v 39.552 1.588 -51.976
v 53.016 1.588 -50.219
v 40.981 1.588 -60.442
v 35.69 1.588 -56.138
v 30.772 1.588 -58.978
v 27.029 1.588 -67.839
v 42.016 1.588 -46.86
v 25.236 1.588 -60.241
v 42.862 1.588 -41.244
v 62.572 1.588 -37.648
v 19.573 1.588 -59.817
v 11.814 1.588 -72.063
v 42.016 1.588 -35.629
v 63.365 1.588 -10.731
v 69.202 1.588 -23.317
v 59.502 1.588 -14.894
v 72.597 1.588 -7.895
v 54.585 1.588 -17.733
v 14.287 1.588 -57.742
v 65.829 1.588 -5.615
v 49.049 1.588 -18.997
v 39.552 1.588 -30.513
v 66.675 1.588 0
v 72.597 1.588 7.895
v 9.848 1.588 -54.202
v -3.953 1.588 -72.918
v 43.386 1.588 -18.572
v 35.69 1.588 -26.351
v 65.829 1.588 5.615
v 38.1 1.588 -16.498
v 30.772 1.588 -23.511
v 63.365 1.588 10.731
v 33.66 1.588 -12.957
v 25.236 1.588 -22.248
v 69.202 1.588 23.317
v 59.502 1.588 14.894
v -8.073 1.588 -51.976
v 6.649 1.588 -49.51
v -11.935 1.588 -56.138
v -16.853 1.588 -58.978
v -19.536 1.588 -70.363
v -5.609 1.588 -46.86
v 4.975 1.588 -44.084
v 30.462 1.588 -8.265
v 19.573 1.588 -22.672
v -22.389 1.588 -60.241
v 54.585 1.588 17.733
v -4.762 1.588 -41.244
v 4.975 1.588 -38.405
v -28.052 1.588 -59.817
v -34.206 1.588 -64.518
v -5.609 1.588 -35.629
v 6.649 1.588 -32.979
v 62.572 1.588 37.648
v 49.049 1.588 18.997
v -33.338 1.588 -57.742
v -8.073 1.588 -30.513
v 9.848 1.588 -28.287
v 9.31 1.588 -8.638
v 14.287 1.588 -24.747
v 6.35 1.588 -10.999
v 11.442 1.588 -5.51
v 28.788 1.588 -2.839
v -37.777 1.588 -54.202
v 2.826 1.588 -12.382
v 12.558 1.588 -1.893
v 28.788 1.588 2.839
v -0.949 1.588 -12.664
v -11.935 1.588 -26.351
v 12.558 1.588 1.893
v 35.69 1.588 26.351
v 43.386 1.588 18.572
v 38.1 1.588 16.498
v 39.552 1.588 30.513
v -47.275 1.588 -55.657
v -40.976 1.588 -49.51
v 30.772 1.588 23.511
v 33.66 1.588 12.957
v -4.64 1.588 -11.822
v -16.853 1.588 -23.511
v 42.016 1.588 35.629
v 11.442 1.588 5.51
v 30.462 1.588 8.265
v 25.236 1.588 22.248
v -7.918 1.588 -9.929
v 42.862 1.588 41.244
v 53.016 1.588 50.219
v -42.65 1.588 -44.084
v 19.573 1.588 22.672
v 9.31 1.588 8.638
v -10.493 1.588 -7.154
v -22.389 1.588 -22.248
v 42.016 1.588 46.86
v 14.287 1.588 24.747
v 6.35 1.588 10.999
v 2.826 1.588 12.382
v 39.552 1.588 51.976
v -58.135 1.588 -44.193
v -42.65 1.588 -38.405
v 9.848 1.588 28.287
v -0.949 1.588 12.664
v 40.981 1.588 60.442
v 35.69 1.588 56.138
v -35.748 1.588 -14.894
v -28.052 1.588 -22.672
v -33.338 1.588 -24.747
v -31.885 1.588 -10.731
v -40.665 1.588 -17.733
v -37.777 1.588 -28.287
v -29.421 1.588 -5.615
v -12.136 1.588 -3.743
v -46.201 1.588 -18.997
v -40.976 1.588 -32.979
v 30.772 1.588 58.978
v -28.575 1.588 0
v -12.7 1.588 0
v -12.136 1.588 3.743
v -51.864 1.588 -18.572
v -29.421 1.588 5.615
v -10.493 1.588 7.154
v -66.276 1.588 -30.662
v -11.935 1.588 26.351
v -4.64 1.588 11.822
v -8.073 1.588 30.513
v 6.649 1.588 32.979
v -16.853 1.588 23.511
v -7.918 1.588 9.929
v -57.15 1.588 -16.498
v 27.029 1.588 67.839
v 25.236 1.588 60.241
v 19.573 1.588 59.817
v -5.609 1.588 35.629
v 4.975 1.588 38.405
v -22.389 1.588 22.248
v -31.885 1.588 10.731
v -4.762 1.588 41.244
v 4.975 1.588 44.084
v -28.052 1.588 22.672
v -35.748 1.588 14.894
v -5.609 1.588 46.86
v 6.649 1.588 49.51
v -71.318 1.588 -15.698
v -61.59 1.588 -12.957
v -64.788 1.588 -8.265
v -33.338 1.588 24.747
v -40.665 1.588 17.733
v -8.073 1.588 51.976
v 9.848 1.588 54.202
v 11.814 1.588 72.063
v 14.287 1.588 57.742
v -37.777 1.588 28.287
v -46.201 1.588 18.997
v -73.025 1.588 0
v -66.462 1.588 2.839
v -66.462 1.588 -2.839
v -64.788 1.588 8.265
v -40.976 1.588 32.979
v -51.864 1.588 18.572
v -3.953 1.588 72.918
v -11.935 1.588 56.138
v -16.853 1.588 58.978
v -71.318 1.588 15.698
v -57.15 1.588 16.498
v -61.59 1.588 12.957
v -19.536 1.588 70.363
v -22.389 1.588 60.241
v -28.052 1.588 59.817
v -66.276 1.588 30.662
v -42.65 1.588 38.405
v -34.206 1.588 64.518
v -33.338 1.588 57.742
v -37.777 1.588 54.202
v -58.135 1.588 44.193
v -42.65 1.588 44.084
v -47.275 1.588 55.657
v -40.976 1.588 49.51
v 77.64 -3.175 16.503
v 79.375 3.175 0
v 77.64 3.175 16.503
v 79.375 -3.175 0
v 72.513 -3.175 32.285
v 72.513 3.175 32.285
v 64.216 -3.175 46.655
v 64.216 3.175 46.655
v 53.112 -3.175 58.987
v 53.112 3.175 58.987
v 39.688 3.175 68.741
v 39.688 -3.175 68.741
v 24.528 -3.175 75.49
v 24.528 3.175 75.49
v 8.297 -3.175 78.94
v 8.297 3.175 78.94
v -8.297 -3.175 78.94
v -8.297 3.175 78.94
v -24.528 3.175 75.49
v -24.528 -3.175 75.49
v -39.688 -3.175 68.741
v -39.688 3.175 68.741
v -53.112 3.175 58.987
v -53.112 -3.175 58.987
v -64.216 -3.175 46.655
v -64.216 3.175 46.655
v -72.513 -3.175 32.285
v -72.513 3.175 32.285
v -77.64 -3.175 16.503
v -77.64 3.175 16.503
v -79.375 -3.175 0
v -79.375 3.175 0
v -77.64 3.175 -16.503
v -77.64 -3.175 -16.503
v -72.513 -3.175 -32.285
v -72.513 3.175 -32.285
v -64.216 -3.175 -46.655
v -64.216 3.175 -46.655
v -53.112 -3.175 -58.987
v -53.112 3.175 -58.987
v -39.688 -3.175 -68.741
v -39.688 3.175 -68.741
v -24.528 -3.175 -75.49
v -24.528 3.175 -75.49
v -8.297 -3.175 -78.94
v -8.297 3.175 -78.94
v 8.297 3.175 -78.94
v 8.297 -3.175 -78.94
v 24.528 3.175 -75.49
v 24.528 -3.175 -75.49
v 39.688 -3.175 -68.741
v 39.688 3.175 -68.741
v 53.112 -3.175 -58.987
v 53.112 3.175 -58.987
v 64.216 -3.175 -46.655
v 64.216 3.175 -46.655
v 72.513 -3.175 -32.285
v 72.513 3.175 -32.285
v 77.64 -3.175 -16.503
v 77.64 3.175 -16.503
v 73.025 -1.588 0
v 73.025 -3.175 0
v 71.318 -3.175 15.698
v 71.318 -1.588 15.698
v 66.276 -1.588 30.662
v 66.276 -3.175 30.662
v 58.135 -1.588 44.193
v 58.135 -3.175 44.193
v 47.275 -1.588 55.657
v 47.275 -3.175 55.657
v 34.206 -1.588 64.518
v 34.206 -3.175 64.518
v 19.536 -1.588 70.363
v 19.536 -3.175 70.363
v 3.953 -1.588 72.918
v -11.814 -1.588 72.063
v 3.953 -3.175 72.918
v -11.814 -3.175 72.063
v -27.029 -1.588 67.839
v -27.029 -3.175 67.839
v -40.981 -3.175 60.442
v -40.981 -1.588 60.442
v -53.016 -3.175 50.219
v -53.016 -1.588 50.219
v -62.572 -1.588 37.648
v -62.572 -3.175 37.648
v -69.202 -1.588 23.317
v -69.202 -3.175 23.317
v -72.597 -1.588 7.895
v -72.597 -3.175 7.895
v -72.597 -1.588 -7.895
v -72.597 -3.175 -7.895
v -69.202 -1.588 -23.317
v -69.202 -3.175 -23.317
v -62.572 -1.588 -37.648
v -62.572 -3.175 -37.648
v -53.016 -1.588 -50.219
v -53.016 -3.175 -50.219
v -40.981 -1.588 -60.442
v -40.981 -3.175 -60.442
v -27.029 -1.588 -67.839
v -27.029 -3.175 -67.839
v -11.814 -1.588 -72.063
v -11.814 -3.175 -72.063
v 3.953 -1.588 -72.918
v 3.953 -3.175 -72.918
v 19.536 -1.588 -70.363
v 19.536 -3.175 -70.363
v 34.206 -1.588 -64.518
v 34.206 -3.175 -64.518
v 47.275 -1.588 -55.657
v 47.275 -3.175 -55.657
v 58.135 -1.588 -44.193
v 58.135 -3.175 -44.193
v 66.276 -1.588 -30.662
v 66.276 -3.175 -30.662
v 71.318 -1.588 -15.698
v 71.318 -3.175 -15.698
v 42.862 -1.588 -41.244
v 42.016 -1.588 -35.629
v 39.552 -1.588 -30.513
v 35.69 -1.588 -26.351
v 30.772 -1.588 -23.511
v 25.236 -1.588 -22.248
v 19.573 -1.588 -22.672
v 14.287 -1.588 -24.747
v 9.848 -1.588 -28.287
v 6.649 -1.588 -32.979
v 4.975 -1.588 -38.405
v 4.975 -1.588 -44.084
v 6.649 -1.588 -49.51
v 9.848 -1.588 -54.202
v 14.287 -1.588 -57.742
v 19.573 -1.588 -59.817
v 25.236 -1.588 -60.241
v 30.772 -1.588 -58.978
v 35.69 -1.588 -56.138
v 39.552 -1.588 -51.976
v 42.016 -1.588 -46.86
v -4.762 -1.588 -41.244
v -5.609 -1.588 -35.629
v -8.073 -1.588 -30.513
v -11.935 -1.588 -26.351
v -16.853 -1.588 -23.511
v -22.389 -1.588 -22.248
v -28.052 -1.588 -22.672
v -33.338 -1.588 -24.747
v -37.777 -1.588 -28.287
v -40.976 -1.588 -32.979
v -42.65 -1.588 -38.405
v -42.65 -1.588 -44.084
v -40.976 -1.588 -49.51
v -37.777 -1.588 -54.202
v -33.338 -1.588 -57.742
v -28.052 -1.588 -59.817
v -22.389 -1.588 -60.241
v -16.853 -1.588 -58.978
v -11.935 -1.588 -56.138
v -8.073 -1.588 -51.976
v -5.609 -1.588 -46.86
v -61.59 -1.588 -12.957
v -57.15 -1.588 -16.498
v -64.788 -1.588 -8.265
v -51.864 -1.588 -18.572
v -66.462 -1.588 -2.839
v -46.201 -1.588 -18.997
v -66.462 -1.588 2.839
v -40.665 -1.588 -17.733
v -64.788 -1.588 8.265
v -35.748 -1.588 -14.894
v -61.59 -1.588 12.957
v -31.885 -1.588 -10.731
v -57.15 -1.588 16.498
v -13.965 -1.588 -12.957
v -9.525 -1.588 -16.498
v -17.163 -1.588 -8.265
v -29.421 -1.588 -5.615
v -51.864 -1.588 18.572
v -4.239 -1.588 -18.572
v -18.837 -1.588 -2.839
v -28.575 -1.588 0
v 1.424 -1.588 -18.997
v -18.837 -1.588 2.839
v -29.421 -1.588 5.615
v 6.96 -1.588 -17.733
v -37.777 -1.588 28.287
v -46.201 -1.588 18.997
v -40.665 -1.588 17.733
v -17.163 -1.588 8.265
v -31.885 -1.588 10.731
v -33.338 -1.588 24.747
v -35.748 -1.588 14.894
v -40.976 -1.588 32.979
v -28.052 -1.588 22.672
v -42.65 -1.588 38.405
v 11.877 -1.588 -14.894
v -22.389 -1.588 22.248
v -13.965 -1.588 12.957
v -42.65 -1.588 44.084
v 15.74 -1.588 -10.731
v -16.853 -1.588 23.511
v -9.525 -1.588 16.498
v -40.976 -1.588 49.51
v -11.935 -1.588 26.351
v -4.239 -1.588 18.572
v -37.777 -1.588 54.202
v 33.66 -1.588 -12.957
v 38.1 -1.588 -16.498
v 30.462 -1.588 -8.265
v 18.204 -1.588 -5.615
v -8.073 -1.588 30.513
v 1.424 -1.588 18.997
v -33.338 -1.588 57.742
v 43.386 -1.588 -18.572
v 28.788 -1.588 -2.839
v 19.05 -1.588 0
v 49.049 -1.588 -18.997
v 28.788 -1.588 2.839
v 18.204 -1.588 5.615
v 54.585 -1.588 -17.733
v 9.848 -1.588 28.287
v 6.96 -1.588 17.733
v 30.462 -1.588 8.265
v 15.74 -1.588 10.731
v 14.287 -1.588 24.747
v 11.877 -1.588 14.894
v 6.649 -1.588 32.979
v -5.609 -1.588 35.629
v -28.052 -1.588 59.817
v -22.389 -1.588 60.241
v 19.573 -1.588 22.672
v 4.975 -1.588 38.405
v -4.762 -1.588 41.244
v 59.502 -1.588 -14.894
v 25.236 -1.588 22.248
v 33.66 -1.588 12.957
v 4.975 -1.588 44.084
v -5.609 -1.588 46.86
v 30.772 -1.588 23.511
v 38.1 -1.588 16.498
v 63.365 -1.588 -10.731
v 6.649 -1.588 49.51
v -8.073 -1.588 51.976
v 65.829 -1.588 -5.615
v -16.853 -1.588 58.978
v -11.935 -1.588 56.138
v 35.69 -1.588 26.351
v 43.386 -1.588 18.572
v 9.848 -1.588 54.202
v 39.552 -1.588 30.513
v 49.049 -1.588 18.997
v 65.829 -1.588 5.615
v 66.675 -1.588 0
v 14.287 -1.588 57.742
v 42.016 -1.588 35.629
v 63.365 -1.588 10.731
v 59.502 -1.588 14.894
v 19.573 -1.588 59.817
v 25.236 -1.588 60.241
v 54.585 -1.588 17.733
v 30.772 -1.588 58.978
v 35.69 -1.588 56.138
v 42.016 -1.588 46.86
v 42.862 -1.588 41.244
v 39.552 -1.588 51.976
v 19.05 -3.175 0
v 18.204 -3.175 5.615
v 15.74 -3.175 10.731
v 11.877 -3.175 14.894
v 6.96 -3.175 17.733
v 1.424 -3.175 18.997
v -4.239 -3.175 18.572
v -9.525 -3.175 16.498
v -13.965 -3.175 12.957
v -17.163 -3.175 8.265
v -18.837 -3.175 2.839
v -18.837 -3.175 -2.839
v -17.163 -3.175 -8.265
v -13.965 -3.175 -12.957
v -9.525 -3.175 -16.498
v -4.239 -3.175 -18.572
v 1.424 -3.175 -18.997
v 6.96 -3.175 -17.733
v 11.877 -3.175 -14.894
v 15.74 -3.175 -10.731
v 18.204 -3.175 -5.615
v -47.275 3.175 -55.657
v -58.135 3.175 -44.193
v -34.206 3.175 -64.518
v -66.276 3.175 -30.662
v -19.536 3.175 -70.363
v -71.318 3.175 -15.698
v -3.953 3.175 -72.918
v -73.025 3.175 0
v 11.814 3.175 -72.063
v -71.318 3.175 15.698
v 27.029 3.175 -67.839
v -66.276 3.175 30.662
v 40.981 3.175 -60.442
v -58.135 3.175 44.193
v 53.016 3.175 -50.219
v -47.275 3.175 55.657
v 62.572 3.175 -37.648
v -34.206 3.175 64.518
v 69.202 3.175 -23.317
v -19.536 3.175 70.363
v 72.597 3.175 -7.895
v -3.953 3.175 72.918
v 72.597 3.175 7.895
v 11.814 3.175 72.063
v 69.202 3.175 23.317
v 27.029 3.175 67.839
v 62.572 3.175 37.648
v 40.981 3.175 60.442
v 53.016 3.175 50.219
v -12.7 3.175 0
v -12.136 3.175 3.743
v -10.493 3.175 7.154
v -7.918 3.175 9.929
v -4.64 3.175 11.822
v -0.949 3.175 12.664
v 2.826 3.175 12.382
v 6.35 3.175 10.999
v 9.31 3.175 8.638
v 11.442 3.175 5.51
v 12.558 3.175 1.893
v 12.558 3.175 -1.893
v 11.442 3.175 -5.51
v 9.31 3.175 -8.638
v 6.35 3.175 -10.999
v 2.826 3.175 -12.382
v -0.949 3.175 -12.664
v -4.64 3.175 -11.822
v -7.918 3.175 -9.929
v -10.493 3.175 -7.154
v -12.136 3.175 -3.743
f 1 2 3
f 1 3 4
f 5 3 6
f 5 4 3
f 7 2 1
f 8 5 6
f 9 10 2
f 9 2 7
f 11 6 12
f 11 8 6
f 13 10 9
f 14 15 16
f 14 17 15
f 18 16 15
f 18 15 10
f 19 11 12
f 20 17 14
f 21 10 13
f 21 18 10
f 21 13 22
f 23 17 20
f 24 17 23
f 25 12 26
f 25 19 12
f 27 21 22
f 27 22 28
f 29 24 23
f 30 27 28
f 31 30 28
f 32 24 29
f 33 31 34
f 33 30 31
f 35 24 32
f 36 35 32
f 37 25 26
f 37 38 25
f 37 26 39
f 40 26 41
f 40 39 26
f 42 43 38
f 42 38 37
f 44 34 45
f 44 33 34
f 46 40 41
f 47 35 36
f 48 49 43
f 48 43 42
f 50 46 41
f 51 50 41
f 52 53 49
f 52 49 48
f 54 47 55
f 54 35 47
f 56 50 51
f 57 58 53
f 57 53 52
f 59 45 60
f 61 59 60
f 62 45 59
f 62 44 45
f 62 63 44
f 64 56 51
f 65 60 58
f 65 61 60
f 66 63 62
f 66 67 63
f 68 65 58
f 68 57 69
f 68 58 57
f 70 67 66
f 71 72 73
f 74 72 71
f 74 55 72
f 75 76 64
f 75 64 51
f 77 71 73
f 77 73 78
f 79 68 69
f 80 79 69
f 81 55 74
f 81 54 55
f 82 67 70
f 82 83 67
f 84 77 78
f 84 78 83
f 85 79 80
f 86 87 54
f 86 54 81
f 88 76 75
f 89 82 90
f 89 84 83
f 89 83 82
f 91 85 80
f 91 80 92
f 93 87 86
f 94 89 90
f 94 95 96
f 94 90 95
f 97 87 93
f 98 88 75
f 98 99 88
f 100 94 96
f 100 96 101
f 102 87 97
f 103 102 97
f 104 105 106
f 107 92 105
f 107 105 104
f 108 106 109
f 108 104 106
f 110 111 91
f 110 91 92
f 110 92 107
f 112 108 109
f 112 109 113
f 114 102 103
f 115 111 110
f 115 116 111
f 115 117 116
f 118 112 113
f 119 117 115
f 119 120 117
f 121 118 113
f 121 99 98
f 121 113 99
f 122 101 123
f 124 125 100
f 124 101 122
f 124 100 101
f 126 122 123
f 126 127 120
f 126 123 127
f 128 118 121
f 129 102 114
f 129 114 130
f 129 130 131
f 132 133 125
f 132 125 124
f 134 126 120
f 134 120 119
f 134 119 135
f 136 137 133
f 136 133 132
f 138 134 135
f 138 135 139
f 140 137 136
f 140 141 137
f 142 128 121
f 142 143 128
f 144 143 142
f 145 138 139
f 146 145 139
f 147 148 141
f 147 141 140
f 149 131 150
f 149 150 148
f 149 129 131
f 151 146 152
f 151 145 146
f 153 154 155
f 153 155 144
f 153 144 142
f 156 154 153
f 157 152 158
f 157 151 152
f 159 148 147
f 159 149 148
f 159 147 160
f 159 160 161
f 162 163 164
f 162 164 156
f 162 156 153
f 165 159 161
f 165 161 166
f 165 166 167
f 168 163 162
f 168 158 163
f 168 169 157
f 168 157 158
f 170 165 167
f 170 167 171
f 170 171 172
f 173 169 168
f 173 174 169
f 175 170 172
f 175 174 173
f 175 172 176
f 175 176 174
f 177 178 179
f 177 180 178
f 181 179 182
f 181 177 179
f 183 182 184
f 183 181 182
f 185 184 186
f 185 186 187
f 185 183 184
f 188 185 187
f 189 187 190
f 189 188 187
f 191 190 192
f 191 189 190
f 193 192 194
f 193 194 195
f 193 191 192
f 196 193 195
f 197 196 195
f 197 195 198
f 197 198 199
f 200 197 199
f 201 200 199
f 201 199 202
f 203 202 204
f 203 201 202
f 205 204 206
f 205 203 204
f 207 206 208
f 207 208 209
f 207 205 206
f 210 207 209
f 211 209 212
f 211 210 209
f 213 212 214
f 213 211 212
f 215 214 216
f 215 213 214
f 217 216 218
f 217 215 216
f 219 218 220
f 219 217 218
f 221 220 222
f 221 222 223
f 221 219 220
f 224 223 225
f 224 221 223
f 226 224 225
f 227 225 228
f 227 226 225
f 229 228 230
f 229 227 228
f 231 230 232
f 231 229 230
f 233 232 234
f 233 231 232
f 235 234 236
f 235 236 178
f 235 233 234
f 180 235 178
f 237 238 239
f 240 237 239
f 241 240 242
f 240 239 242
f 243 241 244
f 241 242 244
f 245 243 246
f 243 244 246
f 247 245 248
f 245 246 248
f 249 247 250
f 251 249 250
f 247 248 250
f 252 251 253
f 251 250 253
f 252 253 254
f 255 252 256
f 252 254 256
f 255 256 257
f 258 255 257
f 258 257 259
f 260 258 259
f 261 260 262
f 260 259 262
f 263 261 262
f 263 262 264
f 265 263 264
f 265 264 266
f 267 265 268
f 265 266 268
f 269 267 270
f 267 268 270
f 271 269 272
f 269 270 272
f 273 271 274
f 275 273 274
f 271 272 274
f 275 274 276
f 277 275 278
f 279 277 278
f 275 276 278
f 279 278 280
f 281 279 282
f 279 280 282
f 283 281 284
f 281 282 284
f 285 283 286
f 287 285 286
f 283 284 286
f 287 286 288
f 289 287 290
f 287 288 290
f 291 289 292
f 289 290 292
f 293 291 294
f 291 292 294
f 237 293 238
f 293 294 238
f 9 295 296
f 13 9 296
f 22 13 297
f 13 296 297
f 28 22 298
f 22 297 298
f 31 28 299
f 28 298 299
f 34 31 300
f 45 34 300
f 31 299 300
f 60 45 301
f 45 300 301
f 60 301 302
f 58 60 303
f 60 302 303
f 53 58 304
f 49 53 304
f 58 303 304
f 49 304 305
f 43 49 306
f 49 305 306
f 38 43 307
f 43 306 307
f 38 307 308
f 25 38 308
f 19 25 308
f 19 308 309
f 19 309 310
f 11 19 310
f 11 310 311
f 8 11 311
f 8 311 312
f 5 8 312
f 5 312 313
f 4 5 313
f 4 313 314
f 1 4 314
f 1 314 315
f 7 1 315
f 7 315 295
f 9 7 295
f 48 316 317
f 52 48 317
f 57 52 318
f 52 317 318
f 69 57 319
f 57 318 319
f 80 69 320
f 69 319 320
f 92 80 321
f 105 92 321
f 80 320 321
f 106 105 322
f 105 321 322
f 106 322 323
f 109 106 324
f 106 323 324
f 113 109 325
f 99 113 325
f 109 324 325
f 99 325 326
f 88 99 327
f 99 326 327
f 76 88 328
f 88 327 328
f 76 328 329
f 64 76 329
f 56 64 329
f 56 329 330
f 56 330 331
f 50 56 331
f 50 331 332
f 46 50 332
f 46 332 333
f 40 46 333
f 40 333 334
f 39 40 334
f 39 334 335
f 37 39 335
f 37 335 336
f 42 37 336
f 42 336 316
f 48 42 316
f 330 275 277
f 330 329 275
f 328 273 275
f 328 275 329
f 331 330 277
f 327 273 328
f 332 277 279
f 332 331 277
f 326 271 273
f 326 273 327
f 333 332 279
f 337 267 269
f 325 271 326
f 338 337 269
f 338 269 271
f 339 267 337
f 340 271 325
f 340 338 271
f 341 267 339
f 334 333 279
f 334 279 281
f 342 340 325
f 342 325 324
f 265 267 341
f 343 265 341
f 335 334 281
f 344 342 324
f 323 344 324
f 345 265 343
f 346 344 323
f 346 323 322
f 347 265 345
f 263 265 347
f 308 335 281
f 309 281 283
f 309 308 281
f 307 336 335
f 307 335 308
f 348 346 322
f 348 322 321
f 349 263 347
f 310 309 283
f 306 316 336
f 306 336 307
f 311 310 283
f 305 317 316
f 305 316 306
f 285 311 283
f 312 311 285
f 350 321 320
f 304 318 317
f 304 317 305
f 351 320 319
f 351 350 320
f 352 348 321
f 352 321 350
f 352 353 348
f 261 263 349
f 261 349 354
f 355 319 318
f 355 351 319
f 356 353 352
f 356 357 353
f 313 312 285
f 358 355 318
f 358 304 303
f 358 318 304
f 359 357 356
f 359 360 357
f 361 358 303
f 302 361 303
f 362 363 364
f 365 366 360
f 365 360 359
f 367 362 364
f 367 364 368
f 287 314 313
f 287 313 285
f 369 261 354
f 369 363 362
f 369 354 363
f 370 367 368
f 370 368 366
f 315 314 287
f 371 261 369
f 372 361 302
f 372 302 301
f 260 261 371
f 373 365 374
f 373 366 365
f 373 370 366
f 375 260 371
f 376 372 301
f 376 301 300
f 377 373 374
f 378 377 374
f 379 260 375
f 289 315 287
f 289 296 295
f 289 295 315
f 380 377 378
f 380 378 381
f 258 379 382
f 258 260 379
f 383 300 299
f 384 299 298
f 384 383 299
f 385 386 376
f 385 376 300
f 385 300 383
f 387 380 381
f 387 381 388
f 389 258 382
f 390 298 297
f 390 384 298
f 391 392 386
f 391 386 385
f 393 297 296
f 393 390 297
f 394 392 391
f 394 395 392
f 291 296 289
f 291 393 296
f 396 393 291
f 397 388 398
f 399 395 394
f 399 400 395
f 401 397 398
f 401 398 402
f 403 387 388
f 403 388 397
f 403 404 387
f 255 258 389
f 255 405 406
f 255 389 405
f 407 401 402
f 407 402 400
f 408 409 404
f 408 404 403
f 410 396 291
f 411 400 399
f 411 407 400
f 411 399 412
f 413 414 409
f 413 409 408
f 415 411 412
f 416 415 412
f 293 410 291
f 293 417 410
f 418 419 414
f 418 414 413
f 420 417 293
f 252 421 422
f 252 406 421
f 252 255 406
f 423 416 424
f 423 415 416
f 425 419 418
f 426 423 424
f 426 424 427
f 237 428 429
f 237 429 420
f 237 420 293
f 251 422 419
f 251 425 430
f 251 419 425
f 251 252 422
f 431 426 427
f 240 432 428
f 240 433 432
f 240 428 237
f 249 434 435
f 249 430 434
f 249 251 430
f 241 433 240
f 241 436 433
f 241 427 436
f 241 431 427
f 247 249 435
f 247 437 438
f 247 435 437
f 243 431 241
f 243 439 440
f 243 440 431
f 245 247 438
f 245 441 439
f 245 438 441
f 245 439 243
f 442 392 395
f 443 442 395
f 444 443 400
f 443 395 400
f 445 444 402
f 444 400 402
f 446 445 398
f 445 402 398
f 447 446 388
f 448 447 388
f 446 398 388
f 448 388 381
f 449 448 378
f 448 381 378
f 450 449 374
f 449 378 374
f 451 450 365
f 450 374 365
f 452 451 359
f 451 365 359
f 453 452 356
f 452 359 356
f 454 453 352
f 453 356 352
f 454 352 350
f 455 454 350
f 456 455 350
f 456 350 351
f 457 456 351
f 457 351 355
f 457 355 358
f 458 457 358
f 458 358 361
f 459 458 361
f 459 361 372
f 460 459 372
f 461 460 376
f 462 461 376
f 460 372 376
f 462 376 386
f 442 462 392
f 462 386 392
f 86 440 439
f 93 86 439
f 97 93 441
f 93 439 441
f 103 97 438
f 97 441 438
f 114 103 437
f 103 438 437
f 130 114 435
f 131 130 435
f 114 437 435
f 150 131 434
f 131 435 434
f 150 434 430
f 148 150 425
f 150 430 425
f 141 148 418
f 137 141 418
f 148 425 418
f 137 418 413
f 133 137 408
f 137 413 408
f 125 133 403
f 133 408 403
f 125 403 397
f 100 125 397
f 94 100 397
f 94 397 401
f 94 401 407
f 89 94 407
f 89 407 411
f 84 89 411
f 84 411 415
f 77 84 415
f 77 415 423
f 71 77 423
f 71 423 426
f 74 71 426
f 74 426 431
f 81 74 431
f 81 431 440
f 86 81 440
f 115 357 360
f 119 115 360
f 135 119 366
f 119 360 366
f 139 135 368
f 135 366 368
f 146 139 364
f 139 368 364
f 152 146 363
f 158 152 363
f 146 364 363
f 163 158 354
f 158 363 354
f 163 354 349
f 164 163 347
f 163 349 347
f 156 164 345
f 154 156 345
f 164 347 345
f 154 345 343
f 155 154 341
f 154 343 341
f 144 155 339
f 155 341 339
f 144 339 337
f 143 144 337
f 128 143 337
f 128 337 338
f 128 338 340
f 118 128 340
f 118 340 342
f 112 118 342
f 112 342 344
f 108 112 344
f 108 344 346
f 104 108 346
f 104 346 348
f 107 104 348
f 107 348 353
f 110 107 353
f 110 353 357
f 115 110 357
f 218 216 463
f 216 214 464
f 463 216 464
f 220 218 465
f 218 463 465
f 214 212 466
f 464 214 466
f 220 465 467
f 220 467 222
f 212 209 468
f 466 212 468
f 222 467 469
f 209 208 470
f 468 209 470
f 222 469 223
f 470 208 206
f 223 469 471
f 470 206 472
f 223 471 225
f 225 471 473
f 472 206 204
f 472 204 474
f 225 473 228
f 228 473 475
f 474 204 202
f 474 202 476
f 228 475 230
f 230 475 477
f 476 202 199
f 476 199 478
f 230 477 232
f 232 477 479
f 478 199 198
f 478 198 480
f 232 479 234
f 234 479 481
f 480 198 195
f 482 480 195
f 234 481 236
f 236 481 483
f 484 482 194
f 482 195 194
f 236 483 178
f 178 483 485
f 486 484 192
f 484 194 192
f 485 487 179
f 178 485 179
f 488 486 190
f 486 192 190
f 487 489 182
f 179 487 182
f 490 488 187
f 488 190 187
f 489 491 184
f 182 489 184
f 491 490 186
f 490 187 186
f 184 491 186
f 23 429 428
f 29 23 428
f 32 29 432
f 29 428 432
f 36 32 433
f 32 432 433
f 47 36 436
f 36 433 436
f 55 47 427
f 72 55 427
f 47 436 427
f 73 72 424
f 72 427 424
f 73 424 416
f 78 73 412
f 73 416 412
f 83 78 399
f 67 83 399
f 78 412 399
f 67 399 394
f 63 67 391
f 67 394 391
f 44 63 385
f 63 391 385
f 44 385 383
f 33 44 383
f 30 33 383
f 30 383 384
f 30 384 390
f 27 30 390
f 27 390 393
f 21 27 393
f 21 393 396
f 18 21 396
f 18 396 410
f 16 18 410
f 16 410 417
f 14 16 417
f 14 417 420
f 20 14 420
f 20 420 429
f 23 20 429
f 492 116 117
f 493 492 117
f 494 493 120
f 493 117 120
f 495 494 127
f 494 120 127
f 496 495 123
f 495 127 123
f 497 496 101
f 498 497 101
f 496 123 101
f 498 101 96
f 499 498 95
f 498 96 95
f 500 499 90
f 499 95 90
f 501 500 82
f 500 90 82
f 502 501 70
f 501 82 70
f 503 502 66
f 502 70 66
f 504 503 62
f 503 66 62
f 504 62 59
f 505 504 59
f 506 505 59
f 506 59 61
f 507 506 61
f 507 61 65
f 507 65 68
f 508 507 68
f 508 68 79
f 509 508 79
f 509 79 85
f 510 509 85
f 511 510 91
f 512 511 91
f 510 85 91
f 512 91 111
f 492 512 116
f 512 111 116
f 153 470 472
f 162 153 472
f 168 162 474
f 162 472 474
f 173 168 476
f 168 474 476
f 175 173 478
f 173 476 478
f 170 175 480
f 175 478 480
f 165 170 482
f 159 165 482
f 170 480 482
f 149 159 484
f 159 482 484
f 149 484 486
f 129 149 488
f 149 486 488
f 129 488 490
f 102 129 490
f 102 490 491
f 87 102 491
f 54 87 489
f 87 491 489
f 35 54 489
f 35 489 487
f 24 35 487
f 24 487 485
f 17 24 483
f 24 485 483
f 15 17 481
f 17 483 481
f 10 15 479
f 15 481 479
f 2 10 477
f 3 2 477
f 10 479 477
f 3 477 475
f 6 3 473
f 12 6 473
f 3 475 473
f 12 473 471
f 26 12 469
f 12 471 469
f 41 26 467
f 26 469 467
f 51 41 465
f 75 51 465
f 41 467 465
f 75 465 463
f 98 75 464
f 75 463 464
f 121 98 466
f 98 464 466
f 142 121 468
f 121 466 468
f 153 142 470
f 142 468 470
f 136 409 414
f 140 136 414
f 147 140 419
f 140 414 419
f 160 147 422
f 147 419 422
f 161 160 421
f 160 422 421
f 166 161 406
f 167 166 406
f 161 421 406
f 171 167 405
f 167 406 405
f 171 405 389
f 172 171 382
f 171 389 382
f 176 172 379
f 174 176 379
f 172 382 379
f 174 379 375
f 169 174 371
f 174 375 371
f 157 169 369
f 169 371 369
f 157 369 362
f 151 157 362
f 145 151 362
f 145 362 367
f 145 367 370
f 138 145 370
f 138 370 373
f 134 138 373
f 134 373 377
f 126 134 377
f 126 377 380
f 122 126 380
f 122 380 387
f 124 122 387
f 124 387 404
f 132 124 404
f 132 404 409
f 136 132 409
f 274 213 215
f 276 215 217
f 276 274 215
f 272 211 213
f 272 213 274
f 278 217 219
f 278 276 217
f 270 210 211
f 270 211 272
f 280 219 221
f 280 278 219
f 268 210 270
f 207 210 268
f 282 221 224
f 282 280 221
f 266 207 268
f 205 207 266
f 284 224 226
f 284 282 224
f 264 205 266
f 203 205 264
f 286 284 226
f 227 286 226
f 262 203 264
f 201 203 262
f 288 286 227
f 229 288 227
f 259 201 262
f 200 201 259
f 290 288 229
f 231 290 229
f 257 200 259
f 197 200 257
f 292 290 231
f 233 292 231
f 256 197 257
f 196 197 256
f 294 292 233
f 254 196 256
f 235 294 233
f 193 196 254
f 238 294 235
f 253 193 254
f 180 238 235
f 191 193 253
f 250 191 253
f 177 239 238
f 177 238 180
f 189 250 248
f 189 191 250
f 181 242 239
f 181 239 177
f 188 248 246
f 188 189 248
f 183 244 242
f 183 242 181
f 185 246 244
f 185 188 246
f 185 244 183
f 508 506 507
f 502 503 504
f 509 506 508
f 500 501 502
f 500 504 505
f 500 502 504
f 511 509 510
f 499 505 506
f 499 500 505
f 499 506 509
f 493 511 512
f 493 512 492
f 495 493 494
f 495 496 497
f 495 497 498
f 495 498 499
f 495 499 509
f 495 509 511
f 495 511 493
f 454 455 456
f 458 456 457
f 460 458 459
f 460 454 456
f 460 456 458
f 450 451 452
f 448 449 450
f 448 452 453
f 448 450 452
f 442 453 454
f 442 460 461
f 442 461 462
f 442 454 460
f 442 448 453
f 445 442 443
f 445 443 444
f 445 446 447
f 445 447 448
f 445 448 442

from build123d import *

# Parameters (mm, degrees)
F0_R      = 79.375
F1_DEPTH  = 3.175
F2_R      = 73.025
F3_DEPTH  = 1.5875
F4_R      = 73.025
F5_DEPTH  = 1.5875
F6_R      = 19.05
F7_DEPTH  = 1.5875
F8_R      = 19.05
F9_DEPTH  = 25.4
F10_R     = 12.7
F11_DEPTH = 1.5875


with BuildPart() as f1:
    # F0 (on Front) → F1 (new body, symmetric)
    with BuildSketch(Plane.XZ):
        Circle(F0_R)
    extrude(amount=F1_DEPTH, both=True)

    # F2 (on face) → F3 (cut)
    with BuildSketch(Plane.XZ.offset(3.175)):
        Circle(F2_R)
    extrude(amount=-F3_DEPTH, mode=Mode.SUBTRACT)

    # F4 (on face) → F5 (cut)
    with BuildSketch(Plane(origin=(0, 3.175, 0), x_dir=(-1, 0, 0), z_dir=(0, 1, 0))):
        Circle(F4_R)
    extrude(amount=-F5_DEPTH, mode=Mode.SUBTRACT)

    # F6 (on face) → F7 (join)
    with BuildSketch(Plane.XZ.offset(1.5875)):
        Circle(F6_R)
    extrude(amount=F7_DEPTH)

    # F8 (on face) → F9 (cut)
    with BuildSketch(Plane.XZ.offset(1.5875)):
        with Locations((-23.8125, -41.24446)):
            Circle(F8_R)
        with Locations((-47.625, 0)):
            Circle(F8_R)
        with Locations((-23.8125, 41.24446)):
            Circle(F8_R)
        with Locations((23.8125, 41.24446)):
            Circle(F8_R)
        with Locations((47.625, 0)):
            Circle(F8_R)
        with Locations((23.8125, -41.24446)):
            Circle(F8_R)
    extrude(amount=-F9_DEPTH, mode=Mode.SUBTRACT)

    # F10 (on face) → F11 (join)
    with BuildSketch(Plane(origin=(0, 1.5875, 0), x_dir=(-1, 0, 0), z_dir=(0, 1, 0))):
        Circle(F10_R)
    extrude(amount=F11_DEPTH)


solid = f1.part
